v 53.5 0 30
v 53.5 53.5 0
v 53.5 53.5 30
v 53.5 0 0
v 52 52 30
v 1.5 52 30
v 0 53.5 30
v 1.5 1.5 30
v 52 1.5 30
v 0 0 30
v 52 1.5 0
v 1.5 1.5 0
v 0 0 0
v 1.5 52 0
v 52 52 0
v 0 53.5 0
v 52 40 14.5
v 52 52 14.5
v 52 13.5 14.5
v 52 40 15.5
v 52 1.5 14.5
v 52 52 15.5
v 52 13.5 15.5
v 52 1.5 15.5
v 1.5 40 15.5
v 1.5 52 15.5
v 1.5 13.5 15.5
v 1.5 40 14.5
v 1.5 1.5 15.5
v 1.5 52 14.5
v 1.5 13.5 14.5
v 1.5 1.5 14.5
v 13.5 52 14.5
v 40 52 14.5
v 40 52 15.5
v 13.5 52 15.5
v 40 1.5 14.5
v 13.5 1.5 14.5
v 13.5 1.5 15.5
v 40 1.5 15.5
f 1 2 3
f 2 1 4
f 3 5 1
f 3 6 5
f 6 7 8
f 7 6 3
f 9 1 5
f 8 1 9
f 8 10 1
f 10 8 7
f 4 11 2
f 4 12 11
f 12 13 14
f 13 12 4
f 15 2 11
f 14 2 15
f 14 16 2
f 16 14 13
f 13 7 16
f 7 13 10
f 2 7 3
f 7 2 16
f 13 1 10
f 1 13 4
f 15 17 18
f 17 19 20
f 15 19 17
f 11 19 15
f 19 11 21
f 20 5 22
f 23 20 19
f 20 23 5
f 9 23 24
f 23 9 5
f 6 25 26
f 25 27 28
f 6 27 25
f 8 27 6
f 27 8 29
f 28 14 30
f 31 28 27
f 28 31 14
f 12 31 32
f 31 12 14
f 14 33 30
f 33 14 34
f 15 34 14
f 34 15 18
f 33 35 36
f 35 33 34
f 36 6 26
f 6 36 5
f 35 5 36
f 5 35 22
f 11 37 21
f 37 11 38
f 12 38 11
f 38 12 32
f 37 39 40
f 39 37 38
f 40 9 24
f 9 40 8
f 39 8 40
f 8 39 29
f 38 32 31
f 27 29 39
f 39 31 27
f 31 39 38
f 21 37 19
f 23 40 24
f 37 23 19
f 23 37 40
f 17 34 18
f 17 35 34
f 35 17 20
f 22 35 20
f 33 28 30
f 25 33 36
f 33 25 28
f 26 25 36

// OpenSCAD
innerSide = 50.3;
tol = 0.2;
z = 30;
wall = 1.5;
cornerSide = 12;
cornerZ = 1;


innerX = innerSide + tol;
innerY = innerSide + tol;

outerX = innerX + 2*wall;
outerY = innerY + 2*wall;

connector();

module connector() {
  difference() {
    cube([outerX, outerY, z]);
    translate([wall, wall, -1])
      cube([innerX, innerY, z + 2]);
  }
  translate([wall, wall, (z - cornerZ)/2])
    corner();

  translate([wall + innerX, wall, (z - cornerZ)/2])
    rotate(90, [0, 0, 1])
      corner();

  translate([wall + innerX, wall + innerY, (z - cornerZ)/2])
    rotate(180, [0, 0, 1])
      corner();

  translate([wall, wall + innerY, (z - cornerZ)/2])
    rotate(270, [0, 0, 1])
      corner();
}

module corner() {
  color("red")
    linear_extrude(height = cornerZ)
      polygon(points=[[0, 0], [cornerSide, 0], [0, cornerSide]]);
}
